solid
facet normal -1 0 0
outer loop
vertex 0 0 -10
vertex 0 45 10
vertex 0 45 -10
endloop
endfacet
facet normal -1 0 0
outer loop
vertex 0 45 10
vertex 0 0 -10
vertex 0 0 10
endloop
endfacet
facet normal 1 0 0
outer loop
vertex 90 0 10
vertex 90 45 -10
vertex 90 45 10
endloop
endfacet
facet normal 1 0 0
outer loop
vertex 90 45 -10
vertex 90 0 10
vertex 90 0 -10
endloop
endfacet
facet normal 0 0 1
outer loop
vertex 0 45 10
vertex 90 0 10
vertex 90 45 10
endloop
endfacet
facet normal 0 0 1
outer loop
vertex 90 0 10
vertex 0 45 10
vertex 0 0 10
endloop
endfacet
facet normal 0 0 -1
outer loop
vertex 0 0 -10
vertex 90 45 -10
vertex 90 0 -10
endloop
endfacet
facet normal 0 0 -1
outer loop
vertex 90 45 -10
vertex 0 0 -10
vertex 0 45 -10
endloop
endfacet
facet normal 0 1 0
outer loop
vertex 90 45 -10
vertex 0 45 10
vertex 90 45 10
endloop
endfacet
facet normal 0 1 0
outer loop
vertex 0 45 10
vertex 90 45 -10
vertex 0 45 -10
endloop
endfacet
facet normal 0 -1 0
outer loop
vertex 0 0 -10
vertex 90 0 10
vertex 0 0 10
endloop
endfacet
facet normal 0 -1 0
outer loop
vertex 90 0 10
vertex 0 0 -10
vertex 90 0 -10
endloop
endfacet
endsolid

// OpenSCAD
// Dimensions for the drying rack
$fn = 64; // Smooth curves

// Base block dimensions
base_length = 90;   // X direction
base_width = 45;    // Y direction
base_height = 20;   // Z direction

// Slot dimensions
slot_length = 77;     // Along X
slot_width = 1.6;       // Y direction (width of slot)
slot_depth = 10;      // Z direction (depth into top face)

// Spacing between slots (center-to-center in Y)
slot_spacing = 3.5;

// Number of slots
num_slots = 10;

// Calculate total width occupied by slots (center-to-center)
total_slot_width = (num_slots - 1) * slot_spacing + slot_width;

// Centering offset for slots in Y
y_offset = (base_width - total_slot_width) / 2;

// Centering offset for slots in X
x_offset = (base_length - slot_length) / 2;

// Create the base block, but now place it so that the bottom is at z = 0
// The original cube was centered at (0,0,0), so we need to shift it down by base_height/2
translate([0, 0, -base_height/2]) {
    cube(size = [base_length, base_width, base_height], center = false);
}

// Cut the slots using difference
difference() {
    // Keep the base block (now sitting on z=0)
    translate([0, 0, -base_height/2]) {
        cube(size = [base_length, base_width, base_height], center = false);
    }

    // For each slot, create a rectangular prism to cut out
    for (i = [0 : num_slots - 1]) {
        // Calculate Y position of this slot (center-to-center spacing)
        y_pos = y_offset + i * slot_spacing;

        // Create a rectangular prism for the slot
        // Cut from z = 0 up to z = slot_depth (so it's 10 mm deep from the top)
        // Extend slightly beyond the top face to ensure clean cut
        translate([0, y_pos, 0]) {
            cube(size = [slot_length, slot_width + 0.02, slot_depth + 0.02], center = false);
        }
    }
}
